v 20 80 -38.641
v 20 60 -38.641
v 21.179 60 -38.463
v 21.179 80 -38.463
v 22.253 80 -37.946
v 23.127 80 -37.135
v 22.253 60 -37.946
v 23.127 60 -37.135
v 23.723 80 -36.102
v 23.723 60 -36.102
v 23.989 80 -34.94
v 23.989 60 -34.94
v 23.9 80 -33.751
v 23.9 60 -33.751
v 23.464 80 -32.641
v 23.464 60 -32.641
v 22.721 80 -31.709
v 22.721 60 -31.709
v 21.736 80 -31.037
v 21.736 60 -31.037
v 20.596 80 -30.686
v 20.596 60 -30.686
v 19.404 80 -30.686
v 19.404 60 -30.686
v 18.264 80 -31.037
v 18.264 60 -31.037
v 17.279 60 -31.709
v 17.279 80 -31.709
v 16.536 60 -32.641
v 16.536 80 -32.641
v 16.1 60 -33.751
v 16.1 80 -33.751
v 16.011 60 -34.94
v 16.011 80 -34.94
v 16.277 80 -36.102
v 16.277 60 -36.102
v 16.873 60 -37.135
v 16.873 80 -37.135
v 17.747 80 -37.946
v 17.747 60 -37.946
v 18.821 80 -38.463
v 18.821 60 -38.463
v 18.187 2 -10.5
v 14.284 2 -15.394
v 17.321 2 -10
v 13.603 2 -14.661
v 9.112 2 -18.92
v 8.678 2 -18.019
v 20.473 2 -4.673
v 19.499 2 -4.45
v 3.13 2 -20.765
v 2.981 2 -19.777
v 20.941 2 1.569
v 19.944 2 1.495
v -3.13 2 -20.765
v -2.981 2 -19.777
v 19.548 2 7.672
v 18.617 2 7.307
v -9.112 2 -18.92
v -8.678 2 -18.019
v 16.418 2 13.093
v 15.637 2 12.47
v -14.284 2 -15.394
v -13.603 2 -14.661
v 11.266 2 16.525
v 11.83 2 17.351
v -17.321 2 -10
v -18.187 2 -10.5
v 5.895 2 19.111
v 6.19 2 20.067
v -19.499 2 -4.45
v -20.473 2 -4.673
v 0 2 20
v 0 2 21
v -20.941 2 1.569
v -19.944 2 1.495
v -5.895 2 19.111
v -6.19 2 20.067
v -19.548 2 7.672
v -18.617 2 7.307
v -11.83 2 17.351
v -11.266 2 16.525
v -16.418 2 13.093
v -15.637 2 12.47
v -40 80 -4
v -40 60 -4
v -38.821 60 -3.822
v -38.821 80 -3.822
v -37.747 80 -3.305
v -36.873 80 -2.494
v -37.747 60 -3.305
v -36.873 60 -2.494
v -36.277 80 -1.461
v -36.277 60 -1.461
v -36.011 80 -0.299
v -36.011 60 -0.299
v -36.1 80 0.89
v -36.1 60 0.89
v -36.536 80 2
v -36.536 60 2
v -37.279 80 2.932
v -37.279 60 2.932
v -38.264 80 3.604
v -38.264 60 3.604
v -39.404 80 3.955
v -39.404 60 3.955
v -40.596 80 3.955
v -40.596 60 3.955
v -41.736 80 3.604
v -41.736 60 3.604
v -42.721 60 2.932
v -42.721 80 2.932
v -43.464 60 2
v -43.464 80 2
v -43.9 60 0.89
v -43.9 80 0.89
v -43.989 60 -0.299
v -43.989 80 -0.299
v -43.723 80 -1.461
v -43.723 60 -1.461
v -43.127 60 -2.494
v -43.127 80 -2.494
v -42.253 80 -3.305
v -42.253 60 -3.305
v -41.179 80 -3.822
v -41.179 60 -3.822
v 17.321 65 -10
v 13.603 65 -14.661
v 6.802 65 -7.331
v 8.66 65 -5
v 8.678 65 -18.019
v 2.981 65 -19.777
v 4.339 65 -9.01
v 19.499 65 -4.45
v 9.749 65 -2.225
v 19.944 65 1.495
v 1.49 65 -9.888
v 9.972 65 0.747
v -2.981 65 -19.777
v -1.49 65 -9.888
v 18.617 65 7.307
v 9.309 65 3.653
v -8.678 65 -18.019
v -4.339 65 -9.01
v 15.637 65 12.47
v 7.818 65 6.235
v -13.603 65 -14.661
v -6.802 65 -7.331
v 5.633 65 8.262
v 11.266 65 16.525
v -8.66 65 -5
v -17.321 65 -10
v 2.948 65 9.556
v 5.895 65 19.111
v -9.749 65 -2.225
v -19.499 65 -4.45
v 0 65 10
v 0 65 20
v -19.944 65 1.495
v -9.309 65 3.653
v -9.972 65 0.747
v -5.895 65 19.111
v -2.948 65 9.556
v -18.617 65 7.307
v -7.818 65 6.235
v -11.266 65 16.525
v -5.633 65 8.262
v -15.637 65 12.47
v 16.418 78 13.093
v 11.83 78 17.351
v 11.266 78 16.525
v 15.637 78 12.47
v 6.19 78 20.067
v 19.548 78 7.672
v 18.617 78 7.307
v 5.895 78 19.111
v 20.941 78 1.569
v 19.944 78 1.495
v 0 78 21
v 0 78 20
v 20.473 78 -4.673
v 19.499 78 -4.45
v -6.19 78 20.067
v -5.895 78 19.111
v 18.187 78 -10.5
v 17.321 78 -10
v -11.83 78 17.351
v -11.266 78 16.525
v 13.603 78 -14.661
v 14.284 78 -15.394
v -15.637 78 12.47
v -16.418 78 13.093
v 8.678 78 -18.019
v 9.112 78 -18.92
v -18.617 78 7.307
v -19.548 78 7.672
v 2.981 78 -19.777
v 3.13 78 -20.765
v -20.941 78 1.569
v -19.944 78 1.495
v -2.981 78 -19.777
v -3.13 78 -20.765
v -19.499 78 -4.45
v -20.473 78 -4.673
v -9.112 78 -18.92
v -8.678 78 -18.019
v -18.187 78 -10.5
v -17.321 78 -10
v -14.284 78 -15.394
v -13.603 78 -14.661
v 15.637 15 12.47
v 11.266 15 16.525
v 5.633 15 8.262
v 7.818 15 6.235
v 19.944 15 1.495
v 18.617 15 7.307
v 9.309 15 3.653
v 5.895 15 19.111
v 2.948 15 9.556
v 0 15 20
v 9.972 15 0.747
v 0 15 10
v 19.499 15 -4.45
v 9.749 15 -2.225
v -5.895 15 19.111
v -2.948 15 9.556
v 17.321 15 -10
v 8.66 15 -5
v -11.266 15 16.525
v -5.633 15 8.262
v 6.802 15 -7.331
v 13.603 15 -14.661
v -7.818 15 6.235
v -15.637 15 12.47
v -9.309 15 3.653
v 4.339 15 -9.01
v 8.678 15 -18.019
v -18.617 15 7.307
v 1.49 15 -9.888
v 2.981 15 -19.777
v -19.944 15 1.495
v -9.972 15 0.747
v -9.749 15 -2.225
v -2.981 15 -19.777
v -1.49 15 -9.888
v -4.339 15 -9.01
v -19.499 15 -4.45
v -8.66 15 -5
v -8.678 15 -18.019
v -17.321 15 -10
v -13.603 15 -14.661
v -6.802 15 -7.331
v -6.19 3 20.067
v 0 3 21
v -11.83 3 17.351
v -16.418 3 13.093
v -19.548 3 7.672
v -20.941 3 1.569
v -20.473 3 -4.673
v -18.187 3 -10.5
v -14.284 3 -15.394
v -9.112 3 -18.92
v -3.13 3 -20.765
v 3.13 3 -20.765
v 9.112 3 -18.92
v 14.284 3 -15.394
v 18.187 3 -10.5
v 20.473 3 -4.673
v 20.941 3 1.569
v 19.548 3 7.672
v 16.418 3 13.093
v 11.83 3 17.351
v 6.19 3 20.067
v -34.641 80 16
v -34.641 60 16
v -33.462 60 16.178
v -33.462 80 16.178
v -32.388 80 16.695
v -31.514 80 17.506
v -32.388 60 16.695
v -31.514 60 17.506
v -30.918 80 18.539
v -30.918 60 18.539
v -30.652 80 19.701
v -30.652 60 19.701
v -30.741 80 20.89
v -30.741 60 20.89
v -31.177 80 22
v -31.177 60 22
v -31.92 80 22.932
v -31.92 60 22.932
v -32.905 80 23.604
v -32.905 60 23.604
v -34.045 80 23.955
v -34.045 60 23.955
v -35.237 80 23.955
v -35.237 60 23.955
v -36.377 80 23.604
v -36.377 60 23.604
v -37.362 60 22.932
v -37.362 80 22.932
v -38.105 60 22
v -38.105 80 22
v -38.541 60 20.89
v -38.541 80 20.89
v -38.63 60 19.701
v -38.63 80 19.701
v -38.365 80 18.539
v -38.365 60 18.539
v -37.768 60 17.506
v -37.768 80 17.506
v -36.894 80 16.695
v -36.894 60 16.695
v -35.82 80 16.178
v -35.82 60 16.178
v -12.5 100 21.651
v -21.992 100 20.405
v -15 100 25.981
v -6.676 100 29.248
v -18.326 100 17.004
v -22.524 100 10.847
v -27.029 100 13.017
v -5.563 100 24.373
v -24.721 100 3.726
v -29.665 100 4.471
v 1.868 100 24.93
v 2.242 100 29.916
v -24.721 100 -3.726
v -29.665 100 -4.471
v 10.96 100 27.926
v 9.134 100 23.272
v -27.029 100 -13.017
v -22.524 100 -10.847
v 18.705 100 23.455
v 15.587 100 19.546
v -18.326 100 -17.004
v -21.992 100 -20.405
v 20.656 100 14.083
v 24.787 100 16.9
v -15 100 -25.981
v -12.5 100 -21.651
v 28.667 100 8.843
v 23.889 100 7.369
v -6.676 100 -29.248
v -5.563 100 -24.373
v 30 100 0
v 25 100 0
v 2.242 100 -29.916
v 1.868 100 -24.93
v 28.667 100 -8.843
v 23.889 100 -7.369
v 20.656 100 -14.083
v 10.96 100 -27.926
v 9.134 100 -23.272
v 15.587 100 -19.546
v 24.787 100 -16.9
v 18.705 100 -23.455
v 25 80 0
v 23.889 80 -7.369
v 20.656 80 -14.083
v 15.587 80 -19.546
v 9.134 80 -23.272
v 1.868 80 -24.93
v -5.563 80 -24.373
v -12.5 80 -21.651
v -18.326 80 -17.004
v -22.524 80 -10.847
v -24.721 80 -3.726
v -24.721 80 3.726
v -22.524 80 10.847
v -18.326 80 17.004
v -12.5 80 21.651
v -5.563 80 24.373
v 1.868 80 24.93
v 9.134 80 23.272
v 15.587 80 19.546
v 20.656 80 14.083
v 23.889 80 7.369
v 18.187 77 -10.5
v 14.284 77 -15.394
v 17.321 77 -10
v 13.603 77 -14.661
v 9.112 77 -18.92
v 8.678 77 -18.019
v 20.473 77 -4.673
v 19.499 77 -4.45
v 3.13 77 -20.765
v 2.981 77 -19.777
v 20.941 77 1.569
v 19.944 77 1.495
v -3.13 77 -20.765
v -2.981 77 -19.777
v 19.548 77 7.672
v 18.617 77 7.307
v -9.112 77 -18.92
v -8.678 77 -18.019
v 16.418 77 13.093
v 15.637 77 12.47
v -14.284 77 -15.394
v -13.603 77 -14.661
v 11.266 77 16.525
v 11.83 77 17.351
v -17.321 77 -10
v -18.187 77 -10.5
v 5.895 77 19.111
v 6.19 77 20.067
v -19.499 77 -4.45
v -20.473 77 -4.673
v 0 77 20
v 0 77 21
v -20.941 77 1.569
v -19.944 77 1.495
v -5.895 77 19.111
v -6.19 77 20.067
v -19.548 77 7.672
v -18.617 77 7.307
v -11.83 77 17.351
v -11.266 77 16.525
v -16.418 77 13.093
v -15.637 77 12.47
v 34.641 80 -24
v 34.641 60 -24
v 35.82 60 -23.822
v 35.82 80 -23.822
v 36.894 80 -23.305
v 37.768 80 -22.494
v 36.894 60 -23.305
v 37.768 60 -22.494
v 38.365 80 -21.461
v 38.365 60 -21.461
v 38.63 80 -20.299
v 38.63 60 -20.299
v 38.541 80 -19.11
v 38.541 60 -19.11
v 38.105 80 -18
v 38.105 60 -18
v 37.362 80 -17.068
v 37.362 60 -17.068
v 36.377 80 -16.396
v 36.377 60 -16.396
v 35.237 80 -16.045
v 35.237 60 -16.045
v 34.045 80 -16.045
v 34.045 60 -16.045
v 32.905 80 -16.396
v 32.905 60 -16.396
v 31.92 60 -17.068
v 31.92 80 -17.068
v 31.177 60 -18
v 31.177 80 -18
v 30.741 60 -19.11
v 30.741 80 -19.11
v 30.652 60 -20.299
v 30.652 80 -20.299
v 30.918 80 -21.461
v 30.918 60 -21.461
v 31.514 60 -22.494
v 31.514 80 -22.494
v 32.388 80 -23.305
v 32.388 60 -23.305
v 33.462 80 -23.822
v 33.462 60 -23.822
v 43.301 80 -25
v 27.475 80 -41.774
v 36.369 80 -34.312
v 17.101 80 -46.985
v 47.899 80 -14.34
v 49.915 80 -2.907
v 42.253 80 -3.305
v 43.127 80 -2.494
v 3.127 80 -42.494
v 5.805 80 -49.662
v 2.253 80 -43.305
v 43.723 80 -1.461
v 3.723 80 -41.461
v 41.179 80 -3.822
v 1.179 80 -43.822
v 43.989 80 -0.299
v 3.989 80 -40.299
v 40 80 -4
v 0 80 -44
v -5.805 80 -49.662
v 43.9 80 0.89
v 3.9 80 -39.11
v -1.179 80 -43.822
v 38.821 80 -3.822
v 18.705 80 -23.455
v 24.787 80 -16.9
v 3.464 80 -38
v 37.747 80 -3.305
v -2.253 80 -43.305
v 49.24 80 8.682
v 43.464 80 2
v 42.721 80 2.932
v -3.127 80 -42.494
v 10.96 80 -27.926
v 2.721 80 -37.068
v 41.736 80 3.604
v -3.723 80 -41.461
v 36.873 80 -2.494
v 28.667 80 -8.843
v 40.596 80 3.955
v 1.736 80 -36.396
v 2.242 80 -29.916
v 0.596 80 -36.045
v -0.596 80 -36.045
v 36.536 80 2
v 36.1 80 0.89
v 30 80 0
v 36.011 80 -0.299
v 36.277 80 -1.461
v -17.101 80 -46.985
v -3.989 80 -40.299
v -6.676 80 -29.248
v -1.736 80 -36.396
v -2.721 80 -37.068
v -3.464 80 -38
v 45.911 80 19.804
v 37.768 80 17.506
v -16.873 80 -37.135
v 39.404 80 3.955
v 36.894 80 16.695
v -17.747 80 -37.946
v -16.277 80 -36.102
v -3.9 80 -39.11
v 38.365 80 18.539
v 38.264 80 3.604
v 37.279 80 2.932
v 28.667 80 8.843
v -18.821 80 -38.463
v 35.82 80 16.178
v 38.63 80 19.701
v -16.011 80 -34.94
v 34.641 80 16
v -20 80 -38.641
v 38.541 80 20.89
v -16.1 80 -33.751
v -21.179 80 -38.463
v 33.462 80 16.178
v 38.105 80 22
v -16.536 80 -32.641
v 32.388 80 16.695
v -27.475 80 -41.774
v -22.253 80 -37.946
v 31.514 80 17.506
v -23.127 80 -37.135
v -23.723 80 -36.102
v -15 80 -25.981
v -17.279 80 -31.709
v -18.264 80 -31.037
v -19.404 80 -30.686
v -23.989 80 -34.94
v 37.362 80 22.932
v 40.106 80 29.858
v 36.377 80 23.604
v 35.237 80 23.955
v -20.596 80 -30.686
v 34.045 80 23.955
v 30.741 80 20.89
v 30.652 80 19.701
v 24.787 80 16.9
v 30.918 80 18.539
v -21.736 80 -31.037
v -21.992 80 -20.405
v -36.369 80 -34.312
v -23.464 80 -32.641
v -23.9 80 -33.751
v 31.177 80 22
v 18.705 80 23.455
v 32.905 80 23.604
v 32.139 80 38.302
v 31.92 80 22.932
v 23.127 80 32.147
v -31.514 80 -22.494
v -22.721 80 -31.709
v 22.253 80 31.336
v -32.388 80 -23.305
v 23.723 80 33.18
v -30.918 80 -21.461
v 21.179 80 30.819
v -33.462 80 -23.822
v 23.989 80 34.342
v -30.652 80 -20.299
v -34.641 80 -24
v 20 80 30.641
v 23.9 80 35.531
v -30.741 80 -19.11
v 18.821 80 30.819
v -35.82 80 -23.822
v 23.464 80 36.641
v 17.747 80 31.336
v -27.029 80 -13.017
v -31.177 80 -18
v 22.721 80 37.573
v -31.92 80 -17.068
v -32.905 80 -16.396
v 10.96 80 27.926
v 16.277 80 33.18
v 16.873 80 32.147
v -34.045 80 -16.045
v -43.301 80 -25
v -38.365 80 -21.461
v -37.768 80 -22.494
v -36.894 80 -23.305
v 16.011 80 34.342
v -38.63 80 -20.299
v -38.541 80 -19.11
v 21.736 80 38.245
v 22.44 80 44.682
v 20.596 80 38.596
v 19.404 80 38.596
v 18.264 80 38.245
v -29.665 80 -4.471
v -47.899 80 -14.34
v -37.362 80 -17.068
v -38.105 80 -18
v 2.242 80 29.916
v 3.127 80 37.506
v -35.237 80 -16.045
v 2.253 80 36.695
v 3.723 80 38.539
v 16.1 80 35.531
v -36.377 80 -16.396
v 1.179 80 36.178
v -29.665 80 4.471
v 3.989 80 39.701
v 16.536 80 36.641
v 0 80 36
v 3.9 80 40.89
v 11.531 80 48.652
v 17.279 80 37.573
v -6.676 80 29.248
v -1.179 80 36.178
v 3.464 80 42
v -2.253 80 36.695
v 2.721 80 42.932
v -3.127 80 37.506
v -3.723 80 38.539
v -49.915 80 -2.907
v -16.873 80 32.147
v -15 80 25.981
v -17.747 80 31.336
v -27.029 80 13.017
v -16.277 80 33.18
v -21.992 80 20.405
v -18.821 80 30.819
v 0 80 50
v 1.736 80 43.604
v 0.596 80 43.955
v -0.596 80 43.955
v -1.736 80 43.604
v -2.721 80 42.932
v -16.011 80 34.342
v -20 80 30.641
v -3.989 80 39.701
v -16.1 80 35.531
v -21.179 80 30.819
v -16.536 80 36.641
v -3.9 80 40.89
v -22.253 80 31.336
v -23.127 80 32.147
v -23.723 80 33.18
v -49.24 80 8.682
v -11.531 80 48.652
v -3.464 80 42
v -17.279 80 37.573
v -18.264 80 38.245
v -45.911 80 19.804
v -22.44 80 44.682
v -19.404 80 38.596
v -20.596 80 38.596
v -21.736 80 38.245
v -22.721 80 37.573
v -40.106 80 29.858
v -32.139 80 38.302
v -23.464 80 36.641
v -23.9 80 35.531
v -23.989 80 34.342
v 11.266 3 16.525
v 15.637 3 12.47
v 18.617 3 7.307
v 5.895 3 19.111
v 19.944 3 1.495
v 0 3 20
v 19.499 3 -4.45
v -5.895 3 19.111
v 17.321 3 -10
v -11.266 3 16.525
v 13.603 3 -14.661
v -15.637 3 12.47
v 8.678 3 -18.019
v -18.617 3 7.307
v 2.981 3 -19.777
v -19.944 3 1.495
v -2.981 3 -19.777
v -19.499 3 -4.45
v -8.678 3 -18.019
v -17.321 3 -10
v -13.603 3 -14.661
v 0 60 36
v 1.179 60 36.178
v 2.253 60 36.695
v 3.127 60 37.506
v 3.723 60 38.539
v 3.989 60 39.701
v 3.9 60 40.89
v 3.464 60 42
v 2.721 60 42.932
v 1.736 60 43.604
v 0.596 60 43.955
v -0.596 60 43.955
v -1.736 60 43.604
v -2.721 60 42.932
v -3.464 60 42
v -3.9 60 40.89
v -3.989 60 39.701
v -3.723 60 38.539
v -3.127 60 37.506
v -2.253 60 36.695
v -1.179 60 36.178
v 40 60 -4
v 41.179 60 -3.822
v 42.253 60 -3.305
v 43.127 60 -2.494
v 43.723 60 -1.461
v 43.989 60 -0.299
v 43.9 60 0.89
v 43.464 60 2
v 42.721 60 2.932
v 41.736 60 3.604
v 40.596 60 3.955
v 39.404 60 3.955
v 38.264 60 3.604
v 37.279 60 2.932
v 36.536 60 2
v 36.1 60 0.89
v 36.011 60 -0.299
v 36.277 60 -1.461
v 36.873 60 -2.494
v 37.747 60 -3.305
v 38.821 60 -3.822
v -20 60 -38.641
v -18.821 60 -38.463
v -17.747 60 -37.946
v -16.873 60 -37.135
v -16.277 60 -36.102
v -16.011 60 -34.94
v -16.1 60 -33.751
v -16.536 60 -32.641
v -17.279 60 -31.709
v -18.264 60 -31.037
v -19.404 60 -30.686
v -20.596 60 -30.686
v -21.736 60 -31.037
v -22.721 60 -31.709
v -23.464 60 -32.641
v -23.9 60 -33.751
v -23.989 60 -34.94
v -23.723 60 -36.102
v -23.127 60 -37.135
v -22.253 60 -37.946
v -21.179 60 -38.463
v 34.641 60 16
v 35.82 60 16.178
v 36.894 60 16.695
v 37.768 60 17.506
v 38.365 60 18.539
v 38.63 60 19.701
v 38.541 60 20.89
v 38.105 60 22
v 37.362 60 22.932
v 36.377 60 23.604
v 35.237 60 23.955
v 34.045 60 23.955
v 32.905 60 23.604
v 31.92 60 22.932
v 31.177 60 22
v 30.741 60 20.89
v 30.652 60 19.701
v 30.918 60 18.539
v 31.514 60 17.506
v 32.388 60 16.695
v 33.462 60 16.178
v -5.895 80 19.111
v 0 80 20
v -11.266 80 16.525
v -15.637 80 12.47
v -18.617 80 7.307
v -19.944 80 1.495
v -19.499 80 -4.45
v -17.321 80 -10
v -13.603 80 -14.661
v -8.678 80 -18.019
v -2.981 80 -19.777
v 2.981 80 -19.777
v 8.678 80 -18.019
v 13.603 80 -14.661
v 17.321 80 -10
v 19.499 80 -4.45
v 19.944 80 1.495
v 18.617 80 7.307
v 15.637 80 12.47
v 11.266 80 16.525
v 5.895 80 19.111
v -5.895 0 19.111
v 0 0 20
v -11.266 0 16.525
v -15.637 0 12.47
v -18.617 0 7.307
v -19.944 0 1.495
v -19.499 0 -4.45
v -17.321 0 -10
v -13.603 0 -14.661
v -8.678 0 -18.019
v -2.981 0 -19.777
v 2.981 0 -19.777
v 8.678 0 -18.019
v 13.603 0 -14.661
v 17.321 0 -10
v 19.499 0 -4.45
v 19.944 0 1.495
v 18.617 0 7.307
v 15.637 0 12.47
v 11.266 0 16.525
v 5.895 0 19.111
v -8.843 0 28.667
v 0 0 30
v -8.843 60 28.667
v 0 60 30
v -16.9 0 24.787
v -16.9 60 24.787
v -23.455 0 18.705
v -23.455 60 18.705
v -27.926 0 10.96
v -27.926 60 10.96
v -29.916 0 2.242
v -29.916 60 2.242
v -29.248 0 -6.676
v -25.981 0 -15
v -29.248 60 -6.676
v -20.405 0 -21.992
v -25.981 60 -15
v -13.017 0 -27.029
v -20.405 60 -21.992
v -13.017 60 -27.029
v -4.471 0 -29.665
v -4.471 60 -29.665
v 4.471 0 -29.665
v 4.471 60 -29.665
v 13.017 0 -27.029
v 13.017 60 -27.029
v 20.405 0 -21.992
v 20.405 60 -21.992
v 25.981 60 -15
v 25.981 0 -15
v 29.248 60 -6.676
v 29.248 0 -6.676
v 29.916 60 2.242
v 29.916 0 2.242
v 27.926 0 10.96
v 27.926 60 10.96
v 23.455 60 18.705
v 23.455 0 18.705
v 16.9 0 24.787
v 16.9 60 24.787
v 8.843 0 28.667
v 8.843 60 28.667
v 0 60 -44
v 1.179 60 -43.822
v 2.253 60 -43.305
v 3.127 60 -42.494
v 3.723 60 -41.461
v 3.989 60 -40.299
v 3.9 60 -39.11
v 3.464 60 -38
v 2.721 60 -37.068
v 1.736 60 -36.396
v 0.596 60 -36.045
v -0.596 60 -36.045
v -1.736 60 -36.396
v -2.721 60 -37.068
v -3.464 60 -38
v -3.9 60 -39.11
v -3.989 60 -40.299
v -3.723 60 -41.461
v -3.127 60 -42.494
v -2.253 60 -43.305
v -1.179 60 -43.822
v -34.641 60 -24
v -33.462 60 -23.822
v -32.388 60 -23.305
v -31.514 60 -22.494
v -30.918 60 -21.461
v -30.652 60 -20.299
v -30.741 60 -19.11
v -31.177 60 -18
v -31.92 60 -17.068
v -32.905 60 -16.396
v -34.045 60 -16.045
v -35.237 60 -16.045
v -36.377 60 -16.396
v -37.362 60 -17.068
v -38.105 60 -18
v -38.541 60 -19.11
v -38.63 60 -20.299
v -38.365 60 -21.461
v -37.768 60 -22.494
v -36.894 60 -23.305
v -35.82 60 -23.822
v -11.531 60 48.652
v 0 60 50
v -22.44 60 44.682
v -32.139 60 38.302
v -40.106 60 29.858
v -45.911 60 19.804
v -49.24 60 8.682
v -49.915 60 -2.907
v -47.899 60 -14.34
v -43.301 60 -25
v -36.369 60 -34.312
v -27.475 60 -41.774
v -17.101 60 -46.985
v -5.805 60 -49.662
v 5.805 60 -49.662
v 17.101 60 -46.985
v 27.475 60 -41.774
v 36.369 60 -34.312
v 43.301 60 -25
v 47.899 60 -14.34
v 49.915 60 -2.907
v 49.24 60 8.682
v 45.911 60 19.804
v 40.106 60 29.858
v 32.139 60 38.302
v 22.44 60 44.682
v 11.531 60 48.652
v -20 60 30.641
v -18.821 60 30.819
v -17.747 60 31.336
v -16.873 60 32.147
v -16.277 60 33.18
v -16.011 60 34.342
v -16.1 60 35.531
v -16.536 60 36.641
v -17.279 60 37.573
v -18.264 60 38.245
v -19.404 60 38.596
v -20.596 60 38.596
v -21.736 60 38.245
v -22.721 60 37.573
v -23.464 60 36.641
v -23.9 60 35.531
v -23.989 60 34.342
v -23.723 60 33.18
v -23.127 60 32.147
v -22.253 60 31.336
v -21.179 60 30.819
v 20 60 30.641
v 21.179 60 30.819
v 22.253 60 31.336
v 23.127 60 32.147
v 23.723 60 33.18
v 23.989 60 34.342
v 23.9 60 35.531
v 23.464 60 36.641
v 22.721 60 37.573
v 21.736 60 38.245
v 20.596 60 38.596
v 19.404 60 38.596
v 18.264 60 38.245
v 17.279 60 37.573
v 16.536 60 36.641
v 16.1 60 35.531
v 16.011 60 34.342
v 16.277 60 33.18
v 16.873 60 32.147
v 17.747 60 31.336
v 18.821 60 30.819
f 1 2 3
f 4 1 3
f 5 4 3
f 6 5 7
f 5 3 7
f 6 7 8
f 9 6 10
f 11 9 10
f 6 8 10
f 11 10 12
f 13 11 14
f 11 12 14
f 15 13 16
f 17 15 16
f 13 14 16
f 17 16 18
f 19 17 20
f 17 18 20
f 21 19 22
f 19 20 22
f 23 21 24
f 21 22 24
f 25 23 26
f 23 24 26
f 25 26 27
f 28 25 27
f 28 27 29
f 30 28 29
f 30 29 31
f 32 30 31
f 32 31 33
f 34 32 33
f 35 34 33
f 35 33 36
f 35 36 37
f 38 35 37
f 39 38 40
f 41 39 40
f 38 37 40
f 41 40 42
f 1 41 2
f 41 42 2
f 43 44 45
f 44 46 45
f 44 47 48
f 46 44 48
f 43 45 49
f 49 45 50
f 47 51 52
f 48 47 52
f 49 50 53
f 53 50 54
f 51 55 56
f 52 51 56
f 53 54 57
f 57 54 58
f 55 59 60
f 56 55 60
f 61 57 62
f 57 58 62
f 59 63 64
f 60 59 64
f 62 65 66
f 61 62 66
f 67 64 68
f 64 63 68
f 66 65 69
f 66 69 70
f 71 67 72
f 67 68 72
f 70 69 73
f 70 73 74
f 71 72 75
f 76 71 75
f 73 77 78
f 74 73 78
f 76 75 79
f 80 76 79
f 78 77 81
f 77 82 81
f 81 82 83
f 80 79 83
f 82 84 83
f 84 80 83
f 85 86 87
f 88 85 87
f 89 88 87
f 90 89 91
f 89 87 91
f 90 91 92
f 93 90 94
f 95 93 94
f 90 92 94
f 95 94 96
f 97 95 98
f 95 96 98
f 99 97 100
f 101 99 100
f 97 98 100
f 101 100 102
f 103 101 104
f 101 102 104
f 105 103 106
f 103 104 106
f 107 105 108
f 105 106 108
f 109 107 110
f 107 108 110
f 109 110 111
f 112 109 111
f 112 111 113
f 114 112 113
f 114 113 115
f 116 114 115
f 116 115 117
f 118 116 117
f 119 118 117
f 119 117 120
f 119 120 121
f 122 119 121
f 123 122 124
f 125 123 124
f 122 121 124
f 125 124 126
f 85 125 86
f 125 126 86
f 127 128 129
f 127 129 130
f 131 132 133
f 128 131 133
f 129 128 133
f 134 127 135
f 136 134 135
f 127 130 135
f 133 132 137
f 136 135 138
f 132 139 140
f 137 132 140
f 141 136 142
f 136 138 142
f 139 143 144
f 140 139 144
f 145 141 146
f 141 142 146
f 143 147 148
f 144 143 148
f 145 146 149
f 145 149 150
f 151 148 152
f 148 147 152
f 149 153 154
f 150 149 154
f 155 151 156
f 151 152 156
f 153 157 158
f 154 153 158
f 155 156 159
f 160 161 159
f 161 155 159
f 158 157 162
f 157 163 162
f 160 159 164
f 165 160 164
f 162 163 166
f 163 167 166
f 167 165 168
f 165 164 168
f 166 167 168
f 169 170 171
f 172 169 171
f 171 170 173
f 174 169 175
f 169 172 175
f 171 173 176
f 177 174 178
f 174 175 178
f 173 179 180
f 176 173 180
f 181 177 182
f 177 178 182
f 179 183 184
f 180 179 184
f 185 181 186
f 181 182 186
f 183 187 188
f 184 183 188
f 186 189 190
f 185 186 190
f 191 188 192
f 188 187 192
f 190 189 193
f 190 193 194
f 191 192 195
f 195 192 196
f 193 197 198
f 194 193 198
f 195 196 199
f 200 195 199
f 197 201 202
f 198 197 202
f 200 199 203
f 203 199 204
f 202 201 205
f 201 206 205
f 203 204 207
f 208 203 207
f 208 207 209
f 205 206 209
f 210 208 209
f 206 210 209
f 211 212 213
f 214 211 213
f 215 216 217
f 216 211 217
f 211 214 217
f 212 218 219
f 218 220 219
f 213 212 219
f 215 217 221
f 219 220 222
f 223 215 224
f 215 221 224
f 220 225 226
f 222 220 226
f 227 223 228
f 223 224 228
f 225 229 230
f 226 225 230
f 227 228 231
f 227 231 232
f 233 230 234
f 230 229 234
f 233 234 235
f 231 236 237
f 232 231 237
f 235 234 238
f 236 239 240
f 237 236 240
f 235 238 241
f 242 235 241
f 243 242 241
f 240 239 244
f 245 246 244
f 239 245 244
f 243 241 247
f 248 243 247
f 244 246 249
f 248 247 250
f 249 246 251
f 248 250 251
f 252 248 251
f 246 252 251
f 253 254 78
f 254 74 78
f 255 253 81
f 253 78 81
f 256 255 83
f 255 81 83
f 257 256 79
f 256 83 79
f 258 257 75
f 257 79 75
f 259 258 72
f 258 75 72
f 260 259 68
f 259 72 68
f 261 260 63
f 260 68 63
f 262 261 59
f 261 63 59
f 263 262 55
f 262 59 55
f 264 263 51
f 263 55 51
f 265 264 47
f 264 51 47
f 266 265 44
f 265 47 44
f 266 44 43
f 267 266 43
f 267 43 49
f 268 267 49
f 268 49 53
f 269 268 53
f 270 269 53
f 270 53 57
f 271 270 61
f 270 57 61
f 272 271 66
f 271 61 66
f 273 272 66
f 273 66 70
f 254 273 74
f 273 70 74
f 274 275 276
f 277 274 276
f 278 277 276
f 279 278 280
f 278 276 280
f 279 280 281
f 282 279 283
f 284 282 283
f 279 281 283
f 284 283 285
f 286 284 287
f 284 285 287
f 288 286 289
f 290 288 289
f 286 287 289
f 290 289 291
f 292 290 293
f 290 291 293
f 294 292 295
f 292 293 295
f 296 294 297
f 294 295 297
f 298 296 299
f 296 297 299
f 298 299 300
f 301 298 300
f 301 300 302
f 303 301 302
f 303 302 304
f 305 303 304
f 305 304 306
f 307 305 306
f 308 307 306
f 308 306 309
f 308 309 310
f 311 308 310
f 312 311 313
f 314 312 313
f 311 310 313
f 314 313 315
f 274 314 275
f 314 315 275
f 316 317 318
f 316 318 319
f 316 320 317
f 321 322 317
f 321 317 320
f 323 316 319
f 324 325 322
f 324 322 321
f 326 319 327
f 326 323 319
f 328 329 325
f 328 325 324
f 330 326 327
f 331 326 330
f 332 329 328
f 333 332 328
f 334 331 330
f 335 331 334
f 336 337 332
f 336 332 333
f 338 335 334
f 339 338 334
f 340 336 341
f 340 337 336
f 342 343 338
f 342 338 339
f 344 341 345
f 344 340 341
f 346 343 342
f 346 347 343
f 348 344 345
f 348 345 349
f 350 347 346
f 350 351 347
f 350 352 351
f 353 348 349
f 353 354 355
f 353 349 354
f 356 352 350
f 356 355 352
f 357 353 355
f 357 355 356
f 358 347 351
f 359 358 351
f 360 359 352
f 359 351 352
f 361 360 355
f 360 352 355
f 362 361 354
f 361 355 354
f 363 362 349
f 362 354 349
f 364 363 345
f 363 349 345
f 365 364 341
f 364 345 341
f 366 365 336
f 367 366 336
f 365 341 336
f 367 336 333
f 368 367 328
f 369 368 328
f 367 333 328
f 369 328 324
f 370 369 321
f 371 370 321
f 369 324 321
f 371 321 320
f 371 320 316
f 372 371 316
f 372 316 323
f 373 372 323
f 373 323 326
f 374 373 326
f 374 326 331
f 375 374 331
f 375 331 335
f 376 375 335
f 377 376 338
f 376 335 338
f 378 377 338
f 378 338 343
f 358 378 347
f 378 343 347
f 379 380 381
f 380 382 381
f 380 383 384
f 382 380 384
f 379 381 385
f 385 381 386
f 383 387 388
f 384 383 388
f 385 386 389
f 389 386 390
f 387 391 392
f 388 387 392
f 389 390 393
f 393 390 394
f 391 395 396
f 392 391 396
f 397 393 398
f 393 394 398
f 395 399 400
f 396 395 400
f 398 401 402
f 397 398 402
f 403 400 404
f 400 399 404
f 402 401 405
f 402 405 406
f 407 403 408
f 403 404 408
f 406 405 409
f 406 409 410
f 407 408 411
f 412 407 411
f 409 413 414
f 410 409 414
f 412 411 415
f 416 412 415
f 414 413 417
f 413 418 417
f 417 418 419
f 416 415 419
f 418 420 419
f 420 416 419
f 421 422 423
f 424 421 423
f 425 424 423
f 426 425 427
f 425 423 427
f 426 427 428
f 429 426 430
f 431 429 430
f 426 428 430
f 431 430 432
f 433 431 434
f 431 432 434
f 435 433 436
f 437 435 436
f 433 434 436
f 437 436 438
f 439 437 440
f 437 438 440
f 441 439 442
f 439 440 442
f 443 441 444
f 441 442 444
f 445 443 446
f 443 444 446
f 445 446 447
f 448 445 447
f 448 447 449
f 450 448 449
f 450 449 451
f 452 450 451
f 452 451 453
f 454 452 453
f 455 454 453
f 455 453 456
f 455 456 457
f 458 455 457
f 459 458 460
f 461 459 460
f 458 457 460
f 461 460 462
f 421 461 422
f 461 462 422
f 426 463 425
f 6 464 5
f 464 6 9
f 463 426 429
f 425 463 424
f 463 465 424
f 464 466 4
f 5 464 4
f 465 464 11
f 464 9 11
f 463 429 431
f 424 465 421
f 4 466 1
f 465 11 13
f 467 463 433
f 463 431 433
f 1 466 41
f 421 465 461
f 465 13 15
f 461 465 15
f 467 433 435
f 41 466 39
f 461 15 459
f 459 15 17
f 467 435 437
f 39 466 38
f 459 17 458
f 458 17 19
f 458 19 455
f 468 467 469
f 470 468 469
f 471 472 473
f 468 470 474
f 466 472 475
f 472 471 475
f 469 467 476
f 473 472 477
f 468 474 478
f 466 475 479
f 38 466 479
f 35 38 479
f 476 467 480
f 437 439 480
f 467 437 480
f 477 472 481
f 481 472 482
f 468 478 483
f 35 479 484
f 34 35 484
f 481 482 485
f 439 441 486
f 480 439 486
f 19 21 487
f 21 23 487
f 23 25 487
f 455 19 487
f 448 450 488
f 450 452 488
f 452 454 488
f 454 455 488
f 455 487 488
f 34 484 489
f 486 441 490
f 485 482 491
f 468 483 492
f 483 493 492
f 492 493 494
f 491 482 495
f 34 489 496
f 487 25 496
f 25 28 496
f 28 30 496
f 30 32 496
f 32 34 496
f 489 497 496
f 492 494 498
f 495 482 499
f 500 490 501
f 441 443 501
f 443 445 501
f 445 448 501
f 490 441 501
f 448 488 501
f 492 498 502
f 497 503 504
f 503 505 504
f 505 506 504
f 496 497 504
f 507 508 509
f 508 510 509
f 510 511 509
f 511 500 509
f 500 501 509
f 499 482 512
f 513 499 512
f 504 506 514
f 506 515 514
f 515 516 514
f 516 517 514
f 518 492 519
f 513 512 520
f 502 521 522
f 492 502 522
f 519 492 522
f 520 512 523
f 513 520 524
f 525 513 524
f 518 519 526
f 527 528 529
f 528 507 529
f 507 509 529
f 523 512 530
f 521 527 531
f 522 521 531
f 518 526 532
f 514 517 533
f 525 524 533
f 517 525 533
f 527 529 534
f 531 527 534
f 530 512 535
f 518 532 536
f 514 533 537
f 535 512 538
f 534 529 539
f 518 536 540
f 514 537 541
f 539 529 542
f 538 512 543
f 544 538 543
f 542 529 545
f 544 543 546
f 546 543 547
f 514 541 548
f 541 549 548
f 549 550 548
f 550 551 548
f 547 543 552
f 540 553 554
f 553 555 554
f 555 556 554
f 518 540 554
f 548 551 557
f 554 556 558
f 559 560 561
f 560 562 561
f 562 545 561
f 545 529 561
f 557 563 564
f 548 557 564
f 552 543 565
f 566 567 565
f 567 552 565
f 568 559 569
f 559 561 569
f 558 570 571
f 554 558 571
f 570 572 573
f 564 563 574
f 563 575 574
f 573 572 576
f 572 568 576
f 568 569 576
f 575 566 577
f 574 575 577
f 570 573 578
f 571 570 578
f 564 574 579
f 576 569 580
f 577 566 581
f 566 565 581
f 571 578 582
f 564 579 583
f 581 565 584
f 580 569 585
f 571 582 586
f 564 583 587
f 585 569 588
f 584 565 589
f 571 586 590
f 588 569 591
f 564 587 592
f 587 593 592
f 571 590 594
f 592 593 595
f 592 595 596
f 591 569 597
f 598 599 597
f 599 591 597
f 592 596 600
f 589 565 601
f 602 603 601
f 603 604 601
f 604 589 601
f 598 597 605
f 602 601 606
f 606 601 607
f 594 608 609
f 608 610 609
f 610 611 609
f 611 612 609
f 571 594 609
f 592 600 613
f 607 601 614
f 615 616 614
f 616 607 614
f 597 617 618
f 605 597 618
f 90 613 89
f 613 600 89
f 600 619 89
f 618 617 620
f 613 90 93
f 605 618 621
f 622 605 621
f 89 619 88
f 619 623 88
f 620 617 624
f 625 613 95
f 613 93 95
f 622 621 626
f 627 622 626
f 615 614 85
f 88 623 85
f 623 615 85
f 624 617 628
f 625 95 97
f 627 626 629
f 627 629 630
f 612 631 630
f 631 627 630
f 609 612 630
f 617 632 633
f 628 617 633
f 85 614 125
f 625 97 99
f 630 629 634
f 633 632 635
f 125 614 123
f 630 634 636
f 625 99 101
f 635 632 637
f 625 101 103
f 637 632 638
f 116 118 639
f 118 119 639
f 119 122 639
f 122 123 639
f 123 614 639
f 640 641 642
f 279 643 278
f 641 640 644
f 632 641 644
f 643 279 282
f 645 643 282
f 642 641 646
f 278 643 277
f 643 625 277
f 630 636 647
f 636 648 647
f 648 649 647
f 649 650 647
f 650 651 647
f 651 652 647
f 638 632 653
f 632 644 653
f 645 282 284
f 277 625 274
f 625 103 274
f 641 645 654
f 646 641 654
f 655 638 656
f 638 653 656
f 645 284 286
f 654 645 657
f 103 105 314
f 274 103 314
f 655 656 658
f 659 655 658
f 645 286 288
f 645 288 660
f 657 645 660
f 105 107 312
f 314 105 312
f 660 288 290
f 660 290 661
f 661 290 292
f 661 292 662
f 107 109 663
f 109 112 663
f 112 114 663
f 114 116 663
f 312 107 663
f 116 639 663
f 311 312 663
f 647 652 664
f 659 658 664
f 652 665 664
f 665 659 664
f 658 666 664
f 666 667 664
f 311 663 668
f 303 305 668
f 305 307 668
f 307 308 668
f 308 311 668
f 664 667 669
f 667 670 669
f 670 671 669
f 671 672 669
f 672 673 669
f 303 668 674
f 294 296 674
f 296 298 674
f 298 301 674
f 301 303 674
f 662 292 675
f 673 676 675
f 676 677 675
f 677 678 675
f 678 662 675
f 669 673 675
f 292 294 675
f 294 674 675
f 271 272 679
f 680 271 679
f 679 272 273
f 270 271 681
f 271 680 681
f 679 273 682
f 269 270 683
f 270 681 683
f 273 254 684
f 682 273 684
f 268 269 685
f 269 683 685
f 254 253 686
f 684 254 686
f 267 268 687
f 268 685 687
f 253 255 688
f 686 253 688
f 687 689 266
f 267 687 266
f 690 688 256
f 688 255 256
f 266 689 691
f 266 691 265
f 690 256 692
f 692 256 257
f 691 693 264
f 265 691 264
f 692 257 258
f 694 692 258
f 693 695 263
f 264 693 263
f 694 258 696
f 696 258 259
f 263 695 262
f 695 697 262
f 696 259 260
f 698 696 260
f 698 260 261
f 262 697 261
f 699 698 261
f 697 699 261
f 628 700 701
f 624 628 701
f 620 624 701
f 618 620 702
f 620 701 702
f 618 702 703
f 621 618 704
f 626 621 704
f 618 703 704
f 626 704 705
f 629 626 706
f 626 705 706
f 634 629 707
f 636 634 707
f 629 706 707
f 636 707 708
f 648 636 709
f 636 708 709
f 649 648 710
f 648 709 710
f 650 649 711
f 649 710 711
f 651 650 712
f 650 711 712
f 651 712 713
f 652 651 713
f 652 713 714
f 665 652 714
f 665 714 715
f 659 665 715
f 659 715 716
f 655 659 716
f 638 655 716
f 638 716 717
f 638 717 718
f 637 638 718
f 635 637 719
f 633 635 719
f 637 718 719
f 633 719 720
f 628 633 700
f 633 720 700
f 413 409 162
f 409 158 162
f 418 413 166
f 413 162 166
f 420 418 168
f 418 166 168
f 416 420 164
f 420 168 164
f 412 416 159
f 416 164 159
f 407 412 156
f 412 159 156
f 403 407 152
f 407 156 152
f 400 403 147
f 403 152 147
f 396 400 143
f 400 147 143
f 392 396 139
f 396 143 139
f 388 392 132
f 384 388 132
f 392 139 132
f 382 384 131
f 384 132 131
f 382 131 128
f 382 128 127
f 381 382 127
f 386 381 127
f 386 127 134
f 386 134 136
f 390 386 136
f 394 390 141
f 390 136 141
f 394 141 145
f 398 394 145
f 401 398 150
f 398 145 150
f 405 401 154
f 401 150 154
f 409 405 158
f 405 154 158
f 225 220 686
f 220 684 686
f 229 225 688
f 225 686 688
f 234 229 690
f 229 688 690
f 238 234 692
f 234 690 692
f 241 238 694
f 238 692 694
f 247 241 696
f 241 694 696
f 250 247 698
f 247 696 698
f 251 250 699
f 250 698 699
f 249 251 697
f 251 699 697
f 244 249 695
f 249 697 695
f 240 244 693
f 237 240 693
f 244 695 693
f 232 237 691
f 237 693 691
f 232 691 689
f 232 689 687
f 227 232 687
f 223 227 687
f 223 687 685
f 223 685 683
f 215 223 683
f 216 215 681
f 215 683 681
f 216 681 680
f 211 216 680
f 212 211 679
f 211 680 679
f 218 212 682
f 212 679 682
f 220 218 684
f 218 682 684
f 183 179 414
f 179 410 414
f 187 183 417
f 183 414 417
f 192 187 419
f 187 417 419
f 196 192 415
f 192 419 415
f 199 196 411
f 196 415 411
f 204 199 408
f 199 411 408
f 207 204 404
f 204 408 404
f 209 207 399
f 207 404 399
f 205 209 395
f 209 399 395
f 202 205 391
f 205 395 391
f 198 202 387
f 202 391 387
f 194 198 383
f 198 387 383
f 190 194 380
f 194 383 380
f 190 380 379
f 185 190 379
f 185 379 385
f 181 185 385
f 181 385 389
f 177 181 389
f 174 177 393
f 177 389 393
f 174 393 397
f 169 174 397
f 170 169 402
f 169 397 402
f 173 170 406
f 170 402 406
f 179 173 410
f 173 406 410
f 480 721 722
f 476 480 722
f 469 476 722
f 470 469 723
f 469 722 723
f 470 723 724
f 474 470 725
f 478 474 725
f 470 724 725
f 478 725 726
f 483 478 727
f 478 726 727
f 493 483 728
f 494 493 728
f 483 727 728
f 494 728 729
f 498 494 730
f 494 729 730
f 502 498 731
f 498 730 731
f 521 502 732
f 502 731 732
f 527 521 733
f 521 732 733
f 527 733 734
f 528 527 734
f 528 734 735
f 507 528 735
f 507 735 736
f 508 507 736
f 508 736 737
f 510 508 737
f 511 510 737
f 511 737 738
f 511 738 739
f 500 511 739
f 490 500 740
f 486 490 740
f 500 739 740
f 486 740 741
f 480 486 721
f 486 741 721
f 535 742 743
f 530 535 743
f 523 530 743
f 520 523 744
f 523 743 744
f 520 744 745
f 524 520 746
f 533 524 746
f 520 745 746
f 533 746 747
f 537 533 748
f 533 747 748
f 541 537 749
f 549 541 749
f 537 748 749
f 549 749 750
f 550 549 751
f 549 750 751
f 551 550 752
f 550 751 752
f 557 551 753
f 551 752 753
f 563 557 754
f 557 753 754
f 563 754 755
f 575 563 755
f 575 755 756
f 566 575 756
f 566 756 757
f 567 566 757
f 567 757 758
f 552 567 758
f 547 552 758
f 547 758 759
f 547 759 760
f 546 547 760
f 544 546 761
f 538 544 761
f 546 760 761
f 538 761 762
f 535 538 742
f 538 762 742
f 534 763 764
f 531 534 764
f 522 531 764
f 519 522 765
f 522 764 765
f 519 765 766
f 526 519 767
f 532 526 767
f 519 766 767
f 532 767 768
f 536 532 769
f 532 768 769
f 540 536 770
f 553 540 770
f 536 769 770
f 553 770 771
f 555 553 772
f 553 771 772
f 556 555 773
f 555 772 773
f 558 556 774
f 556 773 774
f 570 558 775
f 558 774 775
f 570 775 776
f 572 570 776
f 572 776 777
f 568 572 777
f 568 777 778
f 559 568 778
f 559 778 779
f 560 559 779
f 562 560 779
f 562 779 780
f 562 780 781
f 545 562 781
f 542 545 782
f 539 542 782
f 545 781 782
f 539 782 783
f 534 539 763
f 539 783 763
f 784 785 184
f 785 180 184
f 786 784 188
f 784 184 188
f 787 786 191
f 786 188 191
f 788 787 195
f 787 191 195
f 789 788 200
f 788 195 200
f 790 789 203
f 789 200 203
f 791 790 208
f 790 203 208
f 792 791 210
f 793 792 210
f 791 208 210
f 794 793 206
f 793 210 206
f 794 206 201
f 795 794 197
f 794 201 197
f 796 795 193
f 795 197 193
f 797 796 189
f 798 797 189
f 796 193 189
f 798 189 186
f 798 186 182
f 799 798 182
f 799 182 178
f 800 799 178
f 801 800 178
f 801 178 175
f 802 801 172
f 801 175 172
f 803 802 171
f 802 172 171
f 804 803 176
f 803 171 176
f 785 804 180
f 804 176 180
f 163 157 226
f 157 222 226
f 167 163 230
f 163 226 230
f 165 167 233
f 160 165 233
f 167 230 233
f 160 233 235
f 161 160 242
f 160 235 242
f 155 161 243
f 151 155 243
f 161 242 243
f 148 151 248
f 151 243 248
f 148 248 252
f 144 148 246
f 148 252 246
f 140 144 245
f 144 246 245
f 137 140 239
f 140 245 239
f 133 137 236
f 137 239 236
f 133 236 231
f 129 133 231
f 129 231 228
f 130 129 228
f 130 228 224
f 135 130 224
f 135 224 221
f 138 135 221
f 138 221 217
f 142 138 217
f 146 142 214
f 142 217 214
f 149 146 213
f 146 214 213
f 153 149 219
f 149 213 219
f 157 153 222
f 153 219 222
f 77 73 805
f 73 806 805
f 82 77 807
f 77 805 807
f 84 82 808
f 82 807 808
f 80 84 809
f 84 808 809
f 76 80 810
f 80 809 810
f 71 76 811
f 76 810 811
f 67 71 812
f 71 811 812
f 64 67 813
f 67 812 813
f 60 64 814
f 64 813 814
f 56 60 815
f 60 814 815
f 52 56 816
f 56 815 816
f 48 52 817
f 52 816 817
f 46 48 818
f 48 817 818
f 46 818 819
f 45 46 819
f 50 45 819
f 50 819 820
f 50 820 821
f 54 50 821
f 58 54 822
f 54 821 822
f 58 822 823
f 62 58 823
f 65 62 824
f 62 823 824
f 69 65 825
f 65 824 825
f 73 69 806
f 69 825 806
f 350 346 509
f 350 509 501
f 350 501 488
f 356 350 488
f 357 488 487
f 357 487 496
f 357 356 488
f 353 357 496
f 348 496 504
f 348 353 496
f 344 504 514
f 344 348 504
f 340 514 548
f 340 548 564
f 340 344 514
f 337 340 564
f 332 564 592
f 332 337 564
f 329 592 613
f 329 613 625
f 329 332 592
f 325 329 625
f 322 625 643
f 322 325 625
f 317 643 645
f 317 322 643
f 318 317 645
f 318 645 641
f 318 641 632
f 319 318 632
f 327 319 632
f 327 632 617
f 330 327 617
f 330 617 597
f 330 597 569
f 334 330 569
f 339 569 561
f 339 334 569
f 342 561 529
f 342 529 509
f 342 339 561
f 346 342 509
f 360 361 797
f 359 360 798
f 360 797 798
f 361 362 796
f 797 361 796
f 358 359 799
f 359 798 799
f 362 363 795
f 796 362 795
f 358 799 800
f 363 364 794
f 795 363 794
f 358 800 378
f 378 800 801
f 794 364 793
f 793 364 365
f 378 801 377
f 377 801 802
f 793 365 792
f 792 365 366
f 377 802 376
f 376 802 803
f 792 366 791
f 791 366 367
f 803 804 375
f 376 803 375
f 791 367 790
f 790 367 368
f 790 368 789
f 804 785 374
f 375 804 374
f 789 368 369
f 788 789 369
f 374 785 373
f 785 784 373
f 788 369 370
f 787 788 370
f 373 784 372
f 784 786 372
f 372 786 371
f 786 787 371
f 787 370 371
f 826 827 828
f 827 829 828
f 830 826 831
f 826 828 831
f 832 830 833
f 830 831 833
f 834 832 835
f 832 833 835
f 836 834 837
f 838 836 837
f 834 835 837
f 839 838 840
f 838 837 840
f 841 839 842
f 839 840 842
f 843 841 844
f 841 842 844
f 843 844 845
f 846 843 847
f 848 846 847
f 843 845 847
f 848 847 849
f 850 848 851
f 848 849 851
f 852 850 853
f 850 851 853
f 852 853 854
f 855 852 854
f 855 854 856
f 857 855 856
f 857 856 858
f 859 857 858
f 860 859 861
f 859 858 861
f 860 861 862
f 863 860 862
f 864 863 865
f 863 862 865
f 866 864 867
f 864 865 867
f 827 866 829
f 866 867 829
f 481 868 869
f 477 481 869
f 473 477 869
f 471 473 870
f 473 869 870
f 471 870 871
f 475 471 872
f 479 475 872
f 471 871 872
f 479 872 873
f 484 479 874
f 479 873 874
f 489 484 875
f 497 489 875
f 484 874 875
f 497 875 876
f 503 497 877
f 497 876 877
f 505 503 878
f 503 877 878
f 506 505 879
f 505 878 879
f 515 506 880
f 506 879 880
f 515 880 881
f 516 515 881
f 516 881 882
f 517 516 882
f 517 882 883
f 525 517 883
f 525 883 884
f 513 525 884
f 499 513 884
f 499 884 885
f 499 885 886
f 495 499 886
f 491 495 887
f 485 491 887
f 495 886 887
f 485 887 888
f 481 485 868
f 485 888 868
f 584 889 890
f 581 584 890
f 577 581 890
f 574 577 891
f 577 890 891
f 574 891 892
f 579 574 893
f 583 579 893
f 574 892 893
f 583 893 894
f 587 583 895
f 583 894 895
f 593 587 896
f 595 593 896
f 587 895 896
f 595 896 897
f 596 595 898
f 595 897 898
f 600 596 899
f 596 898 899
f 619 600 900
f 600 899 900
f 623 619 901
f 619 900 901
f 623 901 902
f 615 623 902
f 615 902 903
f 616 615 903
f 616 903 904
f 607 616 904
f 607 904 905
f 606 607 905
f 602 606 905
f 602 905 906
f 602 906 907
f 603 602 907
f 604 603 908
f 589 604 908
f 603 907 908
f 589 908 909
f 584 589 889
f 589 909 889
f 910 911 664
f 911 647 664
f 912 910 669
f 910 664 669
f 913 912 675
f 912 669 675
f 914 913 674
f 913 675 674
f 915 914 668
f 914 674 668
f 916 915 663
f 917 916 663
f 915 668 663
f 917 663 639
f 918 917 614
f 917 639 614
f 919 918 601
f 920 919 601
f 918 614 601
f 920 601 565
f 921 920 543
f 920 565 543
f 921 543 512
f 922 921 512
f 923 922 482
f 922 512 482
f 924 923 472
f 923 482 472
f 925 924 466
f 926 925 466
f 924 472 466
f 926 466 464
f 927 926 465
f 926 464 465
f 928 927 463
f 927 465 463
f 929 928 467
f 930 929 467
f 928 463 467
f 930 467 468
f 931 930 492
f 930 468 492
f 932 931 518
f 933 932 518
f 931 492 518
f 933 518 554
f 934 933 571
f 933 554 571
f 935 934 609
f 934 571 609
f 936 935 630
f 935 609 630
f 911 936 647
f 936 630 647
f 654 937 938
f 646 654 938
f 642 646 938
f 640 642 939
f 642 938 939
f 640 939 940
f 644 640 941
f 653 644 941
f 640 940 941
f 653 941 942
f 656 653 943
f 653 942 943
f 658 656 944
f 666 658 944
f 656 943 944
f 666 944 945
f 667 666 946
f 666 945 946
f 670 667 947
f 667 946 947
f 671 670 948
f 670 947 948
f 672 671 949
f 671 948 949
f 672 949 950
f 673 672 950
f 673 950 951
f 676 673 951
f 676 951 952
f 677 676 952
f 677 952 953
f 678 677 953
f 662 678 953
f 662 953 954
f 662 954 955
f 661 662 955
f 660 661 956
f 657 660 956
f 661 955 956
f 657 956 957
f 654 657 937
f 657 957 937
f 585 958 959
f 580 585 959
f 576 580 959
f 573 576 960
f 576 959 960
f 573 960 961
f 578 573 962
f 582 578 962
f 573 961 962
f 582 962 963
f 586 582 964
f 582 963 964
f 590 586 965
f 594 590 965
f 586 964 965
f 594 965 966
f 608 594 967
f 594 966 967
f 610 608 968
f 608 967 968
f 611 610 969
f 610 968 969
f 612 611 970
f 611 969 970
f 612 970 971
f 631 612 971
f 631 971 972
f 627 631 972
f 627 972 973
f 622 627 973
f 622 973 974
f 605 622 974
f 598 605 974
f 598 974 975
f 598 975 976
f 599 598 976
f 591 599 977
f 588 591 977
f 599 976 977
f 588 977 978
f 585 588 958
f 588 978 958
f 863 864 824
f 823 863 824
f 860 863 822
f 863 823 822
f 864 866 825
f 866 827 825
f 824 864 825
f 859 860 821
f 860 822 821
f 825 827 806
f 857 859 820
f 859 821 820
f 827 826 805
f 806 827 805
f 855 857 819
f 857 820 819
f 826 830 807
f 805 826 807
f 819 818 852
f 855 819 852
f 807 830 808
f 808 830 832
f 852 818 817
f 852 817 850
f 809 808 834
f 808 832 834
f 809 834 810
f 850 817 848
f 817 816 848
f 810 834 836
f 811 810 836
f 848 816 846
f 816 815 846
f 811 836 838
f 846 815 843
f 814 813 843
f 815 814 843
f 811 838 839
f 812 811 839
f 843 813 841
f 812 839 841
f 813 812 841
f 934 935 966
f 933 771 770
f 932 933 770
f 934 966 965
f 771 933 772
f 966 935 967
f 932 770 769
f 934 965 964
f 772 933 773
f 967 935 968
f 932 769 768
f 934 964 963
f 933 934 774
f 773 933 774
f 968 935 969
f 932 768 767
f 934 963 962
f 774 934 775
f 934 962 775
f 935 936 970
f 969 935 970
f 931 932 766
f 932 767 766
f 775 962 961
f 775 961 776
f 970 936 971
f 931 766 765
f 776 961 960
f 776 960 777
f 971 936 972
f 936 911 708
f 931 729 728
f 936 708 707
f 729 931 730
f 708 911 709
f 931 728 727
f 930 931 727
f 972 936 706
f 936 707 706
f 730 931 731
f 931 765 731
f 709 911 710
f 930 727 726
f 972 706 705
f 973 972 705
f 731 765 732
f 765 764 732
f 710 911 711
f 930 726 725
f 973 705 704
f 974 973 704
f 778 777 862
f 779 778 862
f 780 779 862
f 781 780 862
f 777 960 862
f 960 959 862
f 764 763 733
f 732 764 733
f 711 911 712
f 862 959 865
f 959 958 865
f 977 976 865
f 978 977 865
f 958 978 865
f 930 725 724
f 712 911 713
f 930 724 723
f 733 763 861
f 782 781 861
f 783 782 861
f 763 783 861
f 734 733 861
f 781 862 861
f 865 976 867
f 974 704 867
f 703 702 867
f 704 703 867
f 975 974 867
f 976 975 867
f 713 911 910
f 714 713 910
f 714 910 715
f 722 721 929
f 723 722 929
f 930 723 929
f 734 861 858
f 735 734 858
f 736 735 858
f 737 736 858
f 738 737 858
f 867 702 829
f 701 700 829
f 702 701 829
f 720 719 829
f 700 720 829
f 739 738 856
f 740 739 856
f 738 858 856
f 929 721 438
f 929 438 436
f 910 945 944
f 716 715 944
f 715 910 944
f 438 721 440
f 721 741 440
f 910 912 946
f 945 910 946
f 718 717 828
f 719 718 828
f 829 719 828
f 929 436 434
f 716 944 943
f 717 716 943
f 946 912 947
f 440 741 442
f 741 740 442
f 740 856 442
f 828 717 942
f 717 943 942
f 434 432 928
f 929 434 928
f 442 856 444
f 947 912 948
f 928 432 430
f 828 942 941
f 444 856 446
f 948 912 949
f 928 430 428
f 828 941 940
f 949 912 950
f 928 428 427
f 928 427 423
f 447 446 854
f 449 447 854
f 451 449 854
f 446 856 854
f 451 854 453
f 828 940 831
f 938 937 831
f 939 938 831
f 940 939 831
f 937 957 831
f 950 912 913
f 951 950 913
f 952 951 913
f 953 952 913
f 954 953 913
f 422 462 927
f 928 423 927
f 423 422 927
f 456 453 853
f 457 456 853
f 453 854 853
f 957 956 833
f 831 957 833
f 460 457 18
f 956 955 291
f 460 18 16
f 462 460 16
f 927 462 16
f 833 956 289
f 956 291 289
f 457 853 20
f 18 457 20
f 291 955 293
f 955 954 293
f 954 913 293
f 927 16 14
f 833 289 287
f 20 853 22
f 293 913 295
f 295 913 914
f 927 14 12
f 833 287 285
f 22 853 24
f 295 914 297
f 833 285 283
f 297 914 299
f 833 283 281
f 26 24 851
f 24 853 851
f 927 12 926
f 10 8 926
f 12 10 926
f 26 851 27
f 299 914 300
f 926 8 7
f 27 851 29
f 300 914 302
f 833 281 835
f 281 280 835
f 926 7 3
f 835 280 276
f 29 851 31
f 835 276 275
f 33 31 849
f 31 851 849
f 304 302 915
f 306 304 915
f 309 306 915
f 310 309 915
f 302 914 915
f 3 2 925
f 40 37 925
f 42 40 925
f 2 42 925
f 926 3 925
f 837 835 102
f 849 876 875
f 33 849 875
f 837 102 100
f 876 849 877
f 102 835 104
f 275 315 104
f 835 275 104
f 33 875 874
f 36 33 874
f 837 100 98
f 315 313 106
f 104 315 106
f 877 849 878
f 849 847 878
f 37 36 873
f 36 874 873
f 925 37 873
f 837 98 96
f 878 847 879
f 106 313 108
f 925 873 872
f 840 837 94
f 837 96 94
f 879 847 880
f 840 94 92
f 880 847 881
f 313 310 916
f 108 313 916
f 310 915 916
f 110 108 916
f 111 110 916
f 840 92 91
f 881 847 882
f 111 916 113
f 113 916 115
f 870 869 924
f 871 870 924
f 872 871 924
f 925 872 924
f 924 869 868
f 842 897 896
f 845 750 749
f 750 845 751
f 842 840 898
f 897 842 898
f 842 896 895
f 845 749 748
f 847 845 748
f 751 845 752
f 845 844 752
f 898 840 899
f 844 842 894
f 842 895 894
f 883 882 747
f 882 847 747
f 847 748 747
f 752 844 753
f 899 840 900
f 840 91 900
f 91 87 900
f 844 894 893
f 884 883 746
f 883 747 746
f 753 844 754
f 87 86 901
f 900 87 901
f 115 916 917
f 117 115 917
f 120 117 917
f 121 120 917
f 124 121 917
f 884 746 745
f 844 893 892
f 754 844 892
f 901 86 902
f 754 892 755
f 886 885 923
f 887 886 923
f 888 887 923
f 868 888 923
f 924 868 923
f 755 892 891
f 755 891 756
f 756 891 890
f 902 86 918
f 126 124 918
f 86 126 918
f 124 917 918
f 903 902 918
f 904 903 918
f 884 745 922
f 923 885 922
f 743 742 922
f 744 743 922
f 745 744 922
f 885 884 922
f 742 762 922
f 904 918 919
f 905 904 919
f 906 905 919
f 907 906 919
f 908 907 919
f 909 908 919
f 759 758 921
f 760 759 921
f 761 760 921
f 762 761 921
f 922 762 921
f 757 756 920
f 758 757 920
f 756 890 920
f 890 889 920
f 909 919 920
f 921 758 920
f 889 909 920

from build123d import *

# Parameters (mm, degrees)
SKETCH2_R           = 4
CUT_EXTRUDE1_DEPTH  = 20
EXTRUDE_THIN1_START = 20
SKETCH3_R           = 30
SKETCH3_R_2         = 25
EXTRUDE_THIN1_DEPTH = 20


with BuildPart() as part:
    # Sketch1 → Revolve1 (revolve)
    with BuildSketch(Plane.XY, mode=Mode.PRIVATE) as revolve1_sk:
        Polygon((50, 80), (20, 80), (20, 78), (21, 78), (21, 77), (20, 77), (20, 65), (10, 65), (10, 15), (20, 15), (20, 3), (21, 3), (21, 2), (20, 2), (20, 0), (30, 0), (30, 60), (50, 60), align=None)
    revolve(revolve1_sk.sketch.rotate(Axis((0, 80, 0), (0, -1, 0)), 90), axis=Axis((0, 80, 0), (0, -1, 0)))

    # Sketch2 → Cut-Extrude1 (cut)
    with BuildSketch(Plane.XZ.offset(-60)):
        with Locations(Location((0, 40, 0), (0, 0, 270))):
            Circle(SKETCH2_R)
        with Locations(Location((20, 34.641016151, 0), (0, 0, 270))):
            Circle(SKETCH2_R)
        with Locations(Location((34.641016151, 20, 0), (0, 0, 270))):
            Circle(SKETCH2_R)
        with Locations(Location((40, 0, 0), (0, 0, 270))):
            Circle(SKETCH2_R)
        with Locations(Location((34.641016151, -20, 0), (0, 0, 270))):
            Circle(SKETCH2_R)
        with Locations(Location((20, -34.641016151, 0), (0, 0, 270))):
            Circle(SKETCH2_R)
        with Locations(Location((0, -40, 0), (0, 0, 270))):
            Circle(SKETCH2_R)
        with Locations(Location((-20, -34.641016151, 0), (0, 0, 270))):
            Circle(SKETCH2_R)
        with Locations(Location((-34.641016151, -20, 0), (0, 0, 270))):
            Circle(SKETCH2_R)
        with Locations(Location((-40, 0, 0), (0, 0, 270))):
            Circle(SKETCH2_R)
        with Locations(Location((-34.641016151, 20, 0), (0, 0, 270))):
            Circle(SKETCH2_R)
        with Locations(Location((-20, 34.641016151, 0), (0, 0, 270))):
            Circle(SKETCH2_R)
    extrude(amount=-CUT_EXTRUDE1_DEPTH, mode=Mode.SUBTRACT)

    # Sketch3 → Extrude-Thin1 (add)
    with BuildSketch(Plane(origin=(0, 80, 0), x_dir=(1, 0, 0), z_dir=(0, 1, 0)).offset(EXTRUDE_THIN1_START)):
        Circle(SKETCH3_R)
        Circle(SKETCH3_R_2, mode=Mode.SUBTRACT)
    extrude(amount=-EXTRUDE_THIN1_DEPTH)


solid = part.part
